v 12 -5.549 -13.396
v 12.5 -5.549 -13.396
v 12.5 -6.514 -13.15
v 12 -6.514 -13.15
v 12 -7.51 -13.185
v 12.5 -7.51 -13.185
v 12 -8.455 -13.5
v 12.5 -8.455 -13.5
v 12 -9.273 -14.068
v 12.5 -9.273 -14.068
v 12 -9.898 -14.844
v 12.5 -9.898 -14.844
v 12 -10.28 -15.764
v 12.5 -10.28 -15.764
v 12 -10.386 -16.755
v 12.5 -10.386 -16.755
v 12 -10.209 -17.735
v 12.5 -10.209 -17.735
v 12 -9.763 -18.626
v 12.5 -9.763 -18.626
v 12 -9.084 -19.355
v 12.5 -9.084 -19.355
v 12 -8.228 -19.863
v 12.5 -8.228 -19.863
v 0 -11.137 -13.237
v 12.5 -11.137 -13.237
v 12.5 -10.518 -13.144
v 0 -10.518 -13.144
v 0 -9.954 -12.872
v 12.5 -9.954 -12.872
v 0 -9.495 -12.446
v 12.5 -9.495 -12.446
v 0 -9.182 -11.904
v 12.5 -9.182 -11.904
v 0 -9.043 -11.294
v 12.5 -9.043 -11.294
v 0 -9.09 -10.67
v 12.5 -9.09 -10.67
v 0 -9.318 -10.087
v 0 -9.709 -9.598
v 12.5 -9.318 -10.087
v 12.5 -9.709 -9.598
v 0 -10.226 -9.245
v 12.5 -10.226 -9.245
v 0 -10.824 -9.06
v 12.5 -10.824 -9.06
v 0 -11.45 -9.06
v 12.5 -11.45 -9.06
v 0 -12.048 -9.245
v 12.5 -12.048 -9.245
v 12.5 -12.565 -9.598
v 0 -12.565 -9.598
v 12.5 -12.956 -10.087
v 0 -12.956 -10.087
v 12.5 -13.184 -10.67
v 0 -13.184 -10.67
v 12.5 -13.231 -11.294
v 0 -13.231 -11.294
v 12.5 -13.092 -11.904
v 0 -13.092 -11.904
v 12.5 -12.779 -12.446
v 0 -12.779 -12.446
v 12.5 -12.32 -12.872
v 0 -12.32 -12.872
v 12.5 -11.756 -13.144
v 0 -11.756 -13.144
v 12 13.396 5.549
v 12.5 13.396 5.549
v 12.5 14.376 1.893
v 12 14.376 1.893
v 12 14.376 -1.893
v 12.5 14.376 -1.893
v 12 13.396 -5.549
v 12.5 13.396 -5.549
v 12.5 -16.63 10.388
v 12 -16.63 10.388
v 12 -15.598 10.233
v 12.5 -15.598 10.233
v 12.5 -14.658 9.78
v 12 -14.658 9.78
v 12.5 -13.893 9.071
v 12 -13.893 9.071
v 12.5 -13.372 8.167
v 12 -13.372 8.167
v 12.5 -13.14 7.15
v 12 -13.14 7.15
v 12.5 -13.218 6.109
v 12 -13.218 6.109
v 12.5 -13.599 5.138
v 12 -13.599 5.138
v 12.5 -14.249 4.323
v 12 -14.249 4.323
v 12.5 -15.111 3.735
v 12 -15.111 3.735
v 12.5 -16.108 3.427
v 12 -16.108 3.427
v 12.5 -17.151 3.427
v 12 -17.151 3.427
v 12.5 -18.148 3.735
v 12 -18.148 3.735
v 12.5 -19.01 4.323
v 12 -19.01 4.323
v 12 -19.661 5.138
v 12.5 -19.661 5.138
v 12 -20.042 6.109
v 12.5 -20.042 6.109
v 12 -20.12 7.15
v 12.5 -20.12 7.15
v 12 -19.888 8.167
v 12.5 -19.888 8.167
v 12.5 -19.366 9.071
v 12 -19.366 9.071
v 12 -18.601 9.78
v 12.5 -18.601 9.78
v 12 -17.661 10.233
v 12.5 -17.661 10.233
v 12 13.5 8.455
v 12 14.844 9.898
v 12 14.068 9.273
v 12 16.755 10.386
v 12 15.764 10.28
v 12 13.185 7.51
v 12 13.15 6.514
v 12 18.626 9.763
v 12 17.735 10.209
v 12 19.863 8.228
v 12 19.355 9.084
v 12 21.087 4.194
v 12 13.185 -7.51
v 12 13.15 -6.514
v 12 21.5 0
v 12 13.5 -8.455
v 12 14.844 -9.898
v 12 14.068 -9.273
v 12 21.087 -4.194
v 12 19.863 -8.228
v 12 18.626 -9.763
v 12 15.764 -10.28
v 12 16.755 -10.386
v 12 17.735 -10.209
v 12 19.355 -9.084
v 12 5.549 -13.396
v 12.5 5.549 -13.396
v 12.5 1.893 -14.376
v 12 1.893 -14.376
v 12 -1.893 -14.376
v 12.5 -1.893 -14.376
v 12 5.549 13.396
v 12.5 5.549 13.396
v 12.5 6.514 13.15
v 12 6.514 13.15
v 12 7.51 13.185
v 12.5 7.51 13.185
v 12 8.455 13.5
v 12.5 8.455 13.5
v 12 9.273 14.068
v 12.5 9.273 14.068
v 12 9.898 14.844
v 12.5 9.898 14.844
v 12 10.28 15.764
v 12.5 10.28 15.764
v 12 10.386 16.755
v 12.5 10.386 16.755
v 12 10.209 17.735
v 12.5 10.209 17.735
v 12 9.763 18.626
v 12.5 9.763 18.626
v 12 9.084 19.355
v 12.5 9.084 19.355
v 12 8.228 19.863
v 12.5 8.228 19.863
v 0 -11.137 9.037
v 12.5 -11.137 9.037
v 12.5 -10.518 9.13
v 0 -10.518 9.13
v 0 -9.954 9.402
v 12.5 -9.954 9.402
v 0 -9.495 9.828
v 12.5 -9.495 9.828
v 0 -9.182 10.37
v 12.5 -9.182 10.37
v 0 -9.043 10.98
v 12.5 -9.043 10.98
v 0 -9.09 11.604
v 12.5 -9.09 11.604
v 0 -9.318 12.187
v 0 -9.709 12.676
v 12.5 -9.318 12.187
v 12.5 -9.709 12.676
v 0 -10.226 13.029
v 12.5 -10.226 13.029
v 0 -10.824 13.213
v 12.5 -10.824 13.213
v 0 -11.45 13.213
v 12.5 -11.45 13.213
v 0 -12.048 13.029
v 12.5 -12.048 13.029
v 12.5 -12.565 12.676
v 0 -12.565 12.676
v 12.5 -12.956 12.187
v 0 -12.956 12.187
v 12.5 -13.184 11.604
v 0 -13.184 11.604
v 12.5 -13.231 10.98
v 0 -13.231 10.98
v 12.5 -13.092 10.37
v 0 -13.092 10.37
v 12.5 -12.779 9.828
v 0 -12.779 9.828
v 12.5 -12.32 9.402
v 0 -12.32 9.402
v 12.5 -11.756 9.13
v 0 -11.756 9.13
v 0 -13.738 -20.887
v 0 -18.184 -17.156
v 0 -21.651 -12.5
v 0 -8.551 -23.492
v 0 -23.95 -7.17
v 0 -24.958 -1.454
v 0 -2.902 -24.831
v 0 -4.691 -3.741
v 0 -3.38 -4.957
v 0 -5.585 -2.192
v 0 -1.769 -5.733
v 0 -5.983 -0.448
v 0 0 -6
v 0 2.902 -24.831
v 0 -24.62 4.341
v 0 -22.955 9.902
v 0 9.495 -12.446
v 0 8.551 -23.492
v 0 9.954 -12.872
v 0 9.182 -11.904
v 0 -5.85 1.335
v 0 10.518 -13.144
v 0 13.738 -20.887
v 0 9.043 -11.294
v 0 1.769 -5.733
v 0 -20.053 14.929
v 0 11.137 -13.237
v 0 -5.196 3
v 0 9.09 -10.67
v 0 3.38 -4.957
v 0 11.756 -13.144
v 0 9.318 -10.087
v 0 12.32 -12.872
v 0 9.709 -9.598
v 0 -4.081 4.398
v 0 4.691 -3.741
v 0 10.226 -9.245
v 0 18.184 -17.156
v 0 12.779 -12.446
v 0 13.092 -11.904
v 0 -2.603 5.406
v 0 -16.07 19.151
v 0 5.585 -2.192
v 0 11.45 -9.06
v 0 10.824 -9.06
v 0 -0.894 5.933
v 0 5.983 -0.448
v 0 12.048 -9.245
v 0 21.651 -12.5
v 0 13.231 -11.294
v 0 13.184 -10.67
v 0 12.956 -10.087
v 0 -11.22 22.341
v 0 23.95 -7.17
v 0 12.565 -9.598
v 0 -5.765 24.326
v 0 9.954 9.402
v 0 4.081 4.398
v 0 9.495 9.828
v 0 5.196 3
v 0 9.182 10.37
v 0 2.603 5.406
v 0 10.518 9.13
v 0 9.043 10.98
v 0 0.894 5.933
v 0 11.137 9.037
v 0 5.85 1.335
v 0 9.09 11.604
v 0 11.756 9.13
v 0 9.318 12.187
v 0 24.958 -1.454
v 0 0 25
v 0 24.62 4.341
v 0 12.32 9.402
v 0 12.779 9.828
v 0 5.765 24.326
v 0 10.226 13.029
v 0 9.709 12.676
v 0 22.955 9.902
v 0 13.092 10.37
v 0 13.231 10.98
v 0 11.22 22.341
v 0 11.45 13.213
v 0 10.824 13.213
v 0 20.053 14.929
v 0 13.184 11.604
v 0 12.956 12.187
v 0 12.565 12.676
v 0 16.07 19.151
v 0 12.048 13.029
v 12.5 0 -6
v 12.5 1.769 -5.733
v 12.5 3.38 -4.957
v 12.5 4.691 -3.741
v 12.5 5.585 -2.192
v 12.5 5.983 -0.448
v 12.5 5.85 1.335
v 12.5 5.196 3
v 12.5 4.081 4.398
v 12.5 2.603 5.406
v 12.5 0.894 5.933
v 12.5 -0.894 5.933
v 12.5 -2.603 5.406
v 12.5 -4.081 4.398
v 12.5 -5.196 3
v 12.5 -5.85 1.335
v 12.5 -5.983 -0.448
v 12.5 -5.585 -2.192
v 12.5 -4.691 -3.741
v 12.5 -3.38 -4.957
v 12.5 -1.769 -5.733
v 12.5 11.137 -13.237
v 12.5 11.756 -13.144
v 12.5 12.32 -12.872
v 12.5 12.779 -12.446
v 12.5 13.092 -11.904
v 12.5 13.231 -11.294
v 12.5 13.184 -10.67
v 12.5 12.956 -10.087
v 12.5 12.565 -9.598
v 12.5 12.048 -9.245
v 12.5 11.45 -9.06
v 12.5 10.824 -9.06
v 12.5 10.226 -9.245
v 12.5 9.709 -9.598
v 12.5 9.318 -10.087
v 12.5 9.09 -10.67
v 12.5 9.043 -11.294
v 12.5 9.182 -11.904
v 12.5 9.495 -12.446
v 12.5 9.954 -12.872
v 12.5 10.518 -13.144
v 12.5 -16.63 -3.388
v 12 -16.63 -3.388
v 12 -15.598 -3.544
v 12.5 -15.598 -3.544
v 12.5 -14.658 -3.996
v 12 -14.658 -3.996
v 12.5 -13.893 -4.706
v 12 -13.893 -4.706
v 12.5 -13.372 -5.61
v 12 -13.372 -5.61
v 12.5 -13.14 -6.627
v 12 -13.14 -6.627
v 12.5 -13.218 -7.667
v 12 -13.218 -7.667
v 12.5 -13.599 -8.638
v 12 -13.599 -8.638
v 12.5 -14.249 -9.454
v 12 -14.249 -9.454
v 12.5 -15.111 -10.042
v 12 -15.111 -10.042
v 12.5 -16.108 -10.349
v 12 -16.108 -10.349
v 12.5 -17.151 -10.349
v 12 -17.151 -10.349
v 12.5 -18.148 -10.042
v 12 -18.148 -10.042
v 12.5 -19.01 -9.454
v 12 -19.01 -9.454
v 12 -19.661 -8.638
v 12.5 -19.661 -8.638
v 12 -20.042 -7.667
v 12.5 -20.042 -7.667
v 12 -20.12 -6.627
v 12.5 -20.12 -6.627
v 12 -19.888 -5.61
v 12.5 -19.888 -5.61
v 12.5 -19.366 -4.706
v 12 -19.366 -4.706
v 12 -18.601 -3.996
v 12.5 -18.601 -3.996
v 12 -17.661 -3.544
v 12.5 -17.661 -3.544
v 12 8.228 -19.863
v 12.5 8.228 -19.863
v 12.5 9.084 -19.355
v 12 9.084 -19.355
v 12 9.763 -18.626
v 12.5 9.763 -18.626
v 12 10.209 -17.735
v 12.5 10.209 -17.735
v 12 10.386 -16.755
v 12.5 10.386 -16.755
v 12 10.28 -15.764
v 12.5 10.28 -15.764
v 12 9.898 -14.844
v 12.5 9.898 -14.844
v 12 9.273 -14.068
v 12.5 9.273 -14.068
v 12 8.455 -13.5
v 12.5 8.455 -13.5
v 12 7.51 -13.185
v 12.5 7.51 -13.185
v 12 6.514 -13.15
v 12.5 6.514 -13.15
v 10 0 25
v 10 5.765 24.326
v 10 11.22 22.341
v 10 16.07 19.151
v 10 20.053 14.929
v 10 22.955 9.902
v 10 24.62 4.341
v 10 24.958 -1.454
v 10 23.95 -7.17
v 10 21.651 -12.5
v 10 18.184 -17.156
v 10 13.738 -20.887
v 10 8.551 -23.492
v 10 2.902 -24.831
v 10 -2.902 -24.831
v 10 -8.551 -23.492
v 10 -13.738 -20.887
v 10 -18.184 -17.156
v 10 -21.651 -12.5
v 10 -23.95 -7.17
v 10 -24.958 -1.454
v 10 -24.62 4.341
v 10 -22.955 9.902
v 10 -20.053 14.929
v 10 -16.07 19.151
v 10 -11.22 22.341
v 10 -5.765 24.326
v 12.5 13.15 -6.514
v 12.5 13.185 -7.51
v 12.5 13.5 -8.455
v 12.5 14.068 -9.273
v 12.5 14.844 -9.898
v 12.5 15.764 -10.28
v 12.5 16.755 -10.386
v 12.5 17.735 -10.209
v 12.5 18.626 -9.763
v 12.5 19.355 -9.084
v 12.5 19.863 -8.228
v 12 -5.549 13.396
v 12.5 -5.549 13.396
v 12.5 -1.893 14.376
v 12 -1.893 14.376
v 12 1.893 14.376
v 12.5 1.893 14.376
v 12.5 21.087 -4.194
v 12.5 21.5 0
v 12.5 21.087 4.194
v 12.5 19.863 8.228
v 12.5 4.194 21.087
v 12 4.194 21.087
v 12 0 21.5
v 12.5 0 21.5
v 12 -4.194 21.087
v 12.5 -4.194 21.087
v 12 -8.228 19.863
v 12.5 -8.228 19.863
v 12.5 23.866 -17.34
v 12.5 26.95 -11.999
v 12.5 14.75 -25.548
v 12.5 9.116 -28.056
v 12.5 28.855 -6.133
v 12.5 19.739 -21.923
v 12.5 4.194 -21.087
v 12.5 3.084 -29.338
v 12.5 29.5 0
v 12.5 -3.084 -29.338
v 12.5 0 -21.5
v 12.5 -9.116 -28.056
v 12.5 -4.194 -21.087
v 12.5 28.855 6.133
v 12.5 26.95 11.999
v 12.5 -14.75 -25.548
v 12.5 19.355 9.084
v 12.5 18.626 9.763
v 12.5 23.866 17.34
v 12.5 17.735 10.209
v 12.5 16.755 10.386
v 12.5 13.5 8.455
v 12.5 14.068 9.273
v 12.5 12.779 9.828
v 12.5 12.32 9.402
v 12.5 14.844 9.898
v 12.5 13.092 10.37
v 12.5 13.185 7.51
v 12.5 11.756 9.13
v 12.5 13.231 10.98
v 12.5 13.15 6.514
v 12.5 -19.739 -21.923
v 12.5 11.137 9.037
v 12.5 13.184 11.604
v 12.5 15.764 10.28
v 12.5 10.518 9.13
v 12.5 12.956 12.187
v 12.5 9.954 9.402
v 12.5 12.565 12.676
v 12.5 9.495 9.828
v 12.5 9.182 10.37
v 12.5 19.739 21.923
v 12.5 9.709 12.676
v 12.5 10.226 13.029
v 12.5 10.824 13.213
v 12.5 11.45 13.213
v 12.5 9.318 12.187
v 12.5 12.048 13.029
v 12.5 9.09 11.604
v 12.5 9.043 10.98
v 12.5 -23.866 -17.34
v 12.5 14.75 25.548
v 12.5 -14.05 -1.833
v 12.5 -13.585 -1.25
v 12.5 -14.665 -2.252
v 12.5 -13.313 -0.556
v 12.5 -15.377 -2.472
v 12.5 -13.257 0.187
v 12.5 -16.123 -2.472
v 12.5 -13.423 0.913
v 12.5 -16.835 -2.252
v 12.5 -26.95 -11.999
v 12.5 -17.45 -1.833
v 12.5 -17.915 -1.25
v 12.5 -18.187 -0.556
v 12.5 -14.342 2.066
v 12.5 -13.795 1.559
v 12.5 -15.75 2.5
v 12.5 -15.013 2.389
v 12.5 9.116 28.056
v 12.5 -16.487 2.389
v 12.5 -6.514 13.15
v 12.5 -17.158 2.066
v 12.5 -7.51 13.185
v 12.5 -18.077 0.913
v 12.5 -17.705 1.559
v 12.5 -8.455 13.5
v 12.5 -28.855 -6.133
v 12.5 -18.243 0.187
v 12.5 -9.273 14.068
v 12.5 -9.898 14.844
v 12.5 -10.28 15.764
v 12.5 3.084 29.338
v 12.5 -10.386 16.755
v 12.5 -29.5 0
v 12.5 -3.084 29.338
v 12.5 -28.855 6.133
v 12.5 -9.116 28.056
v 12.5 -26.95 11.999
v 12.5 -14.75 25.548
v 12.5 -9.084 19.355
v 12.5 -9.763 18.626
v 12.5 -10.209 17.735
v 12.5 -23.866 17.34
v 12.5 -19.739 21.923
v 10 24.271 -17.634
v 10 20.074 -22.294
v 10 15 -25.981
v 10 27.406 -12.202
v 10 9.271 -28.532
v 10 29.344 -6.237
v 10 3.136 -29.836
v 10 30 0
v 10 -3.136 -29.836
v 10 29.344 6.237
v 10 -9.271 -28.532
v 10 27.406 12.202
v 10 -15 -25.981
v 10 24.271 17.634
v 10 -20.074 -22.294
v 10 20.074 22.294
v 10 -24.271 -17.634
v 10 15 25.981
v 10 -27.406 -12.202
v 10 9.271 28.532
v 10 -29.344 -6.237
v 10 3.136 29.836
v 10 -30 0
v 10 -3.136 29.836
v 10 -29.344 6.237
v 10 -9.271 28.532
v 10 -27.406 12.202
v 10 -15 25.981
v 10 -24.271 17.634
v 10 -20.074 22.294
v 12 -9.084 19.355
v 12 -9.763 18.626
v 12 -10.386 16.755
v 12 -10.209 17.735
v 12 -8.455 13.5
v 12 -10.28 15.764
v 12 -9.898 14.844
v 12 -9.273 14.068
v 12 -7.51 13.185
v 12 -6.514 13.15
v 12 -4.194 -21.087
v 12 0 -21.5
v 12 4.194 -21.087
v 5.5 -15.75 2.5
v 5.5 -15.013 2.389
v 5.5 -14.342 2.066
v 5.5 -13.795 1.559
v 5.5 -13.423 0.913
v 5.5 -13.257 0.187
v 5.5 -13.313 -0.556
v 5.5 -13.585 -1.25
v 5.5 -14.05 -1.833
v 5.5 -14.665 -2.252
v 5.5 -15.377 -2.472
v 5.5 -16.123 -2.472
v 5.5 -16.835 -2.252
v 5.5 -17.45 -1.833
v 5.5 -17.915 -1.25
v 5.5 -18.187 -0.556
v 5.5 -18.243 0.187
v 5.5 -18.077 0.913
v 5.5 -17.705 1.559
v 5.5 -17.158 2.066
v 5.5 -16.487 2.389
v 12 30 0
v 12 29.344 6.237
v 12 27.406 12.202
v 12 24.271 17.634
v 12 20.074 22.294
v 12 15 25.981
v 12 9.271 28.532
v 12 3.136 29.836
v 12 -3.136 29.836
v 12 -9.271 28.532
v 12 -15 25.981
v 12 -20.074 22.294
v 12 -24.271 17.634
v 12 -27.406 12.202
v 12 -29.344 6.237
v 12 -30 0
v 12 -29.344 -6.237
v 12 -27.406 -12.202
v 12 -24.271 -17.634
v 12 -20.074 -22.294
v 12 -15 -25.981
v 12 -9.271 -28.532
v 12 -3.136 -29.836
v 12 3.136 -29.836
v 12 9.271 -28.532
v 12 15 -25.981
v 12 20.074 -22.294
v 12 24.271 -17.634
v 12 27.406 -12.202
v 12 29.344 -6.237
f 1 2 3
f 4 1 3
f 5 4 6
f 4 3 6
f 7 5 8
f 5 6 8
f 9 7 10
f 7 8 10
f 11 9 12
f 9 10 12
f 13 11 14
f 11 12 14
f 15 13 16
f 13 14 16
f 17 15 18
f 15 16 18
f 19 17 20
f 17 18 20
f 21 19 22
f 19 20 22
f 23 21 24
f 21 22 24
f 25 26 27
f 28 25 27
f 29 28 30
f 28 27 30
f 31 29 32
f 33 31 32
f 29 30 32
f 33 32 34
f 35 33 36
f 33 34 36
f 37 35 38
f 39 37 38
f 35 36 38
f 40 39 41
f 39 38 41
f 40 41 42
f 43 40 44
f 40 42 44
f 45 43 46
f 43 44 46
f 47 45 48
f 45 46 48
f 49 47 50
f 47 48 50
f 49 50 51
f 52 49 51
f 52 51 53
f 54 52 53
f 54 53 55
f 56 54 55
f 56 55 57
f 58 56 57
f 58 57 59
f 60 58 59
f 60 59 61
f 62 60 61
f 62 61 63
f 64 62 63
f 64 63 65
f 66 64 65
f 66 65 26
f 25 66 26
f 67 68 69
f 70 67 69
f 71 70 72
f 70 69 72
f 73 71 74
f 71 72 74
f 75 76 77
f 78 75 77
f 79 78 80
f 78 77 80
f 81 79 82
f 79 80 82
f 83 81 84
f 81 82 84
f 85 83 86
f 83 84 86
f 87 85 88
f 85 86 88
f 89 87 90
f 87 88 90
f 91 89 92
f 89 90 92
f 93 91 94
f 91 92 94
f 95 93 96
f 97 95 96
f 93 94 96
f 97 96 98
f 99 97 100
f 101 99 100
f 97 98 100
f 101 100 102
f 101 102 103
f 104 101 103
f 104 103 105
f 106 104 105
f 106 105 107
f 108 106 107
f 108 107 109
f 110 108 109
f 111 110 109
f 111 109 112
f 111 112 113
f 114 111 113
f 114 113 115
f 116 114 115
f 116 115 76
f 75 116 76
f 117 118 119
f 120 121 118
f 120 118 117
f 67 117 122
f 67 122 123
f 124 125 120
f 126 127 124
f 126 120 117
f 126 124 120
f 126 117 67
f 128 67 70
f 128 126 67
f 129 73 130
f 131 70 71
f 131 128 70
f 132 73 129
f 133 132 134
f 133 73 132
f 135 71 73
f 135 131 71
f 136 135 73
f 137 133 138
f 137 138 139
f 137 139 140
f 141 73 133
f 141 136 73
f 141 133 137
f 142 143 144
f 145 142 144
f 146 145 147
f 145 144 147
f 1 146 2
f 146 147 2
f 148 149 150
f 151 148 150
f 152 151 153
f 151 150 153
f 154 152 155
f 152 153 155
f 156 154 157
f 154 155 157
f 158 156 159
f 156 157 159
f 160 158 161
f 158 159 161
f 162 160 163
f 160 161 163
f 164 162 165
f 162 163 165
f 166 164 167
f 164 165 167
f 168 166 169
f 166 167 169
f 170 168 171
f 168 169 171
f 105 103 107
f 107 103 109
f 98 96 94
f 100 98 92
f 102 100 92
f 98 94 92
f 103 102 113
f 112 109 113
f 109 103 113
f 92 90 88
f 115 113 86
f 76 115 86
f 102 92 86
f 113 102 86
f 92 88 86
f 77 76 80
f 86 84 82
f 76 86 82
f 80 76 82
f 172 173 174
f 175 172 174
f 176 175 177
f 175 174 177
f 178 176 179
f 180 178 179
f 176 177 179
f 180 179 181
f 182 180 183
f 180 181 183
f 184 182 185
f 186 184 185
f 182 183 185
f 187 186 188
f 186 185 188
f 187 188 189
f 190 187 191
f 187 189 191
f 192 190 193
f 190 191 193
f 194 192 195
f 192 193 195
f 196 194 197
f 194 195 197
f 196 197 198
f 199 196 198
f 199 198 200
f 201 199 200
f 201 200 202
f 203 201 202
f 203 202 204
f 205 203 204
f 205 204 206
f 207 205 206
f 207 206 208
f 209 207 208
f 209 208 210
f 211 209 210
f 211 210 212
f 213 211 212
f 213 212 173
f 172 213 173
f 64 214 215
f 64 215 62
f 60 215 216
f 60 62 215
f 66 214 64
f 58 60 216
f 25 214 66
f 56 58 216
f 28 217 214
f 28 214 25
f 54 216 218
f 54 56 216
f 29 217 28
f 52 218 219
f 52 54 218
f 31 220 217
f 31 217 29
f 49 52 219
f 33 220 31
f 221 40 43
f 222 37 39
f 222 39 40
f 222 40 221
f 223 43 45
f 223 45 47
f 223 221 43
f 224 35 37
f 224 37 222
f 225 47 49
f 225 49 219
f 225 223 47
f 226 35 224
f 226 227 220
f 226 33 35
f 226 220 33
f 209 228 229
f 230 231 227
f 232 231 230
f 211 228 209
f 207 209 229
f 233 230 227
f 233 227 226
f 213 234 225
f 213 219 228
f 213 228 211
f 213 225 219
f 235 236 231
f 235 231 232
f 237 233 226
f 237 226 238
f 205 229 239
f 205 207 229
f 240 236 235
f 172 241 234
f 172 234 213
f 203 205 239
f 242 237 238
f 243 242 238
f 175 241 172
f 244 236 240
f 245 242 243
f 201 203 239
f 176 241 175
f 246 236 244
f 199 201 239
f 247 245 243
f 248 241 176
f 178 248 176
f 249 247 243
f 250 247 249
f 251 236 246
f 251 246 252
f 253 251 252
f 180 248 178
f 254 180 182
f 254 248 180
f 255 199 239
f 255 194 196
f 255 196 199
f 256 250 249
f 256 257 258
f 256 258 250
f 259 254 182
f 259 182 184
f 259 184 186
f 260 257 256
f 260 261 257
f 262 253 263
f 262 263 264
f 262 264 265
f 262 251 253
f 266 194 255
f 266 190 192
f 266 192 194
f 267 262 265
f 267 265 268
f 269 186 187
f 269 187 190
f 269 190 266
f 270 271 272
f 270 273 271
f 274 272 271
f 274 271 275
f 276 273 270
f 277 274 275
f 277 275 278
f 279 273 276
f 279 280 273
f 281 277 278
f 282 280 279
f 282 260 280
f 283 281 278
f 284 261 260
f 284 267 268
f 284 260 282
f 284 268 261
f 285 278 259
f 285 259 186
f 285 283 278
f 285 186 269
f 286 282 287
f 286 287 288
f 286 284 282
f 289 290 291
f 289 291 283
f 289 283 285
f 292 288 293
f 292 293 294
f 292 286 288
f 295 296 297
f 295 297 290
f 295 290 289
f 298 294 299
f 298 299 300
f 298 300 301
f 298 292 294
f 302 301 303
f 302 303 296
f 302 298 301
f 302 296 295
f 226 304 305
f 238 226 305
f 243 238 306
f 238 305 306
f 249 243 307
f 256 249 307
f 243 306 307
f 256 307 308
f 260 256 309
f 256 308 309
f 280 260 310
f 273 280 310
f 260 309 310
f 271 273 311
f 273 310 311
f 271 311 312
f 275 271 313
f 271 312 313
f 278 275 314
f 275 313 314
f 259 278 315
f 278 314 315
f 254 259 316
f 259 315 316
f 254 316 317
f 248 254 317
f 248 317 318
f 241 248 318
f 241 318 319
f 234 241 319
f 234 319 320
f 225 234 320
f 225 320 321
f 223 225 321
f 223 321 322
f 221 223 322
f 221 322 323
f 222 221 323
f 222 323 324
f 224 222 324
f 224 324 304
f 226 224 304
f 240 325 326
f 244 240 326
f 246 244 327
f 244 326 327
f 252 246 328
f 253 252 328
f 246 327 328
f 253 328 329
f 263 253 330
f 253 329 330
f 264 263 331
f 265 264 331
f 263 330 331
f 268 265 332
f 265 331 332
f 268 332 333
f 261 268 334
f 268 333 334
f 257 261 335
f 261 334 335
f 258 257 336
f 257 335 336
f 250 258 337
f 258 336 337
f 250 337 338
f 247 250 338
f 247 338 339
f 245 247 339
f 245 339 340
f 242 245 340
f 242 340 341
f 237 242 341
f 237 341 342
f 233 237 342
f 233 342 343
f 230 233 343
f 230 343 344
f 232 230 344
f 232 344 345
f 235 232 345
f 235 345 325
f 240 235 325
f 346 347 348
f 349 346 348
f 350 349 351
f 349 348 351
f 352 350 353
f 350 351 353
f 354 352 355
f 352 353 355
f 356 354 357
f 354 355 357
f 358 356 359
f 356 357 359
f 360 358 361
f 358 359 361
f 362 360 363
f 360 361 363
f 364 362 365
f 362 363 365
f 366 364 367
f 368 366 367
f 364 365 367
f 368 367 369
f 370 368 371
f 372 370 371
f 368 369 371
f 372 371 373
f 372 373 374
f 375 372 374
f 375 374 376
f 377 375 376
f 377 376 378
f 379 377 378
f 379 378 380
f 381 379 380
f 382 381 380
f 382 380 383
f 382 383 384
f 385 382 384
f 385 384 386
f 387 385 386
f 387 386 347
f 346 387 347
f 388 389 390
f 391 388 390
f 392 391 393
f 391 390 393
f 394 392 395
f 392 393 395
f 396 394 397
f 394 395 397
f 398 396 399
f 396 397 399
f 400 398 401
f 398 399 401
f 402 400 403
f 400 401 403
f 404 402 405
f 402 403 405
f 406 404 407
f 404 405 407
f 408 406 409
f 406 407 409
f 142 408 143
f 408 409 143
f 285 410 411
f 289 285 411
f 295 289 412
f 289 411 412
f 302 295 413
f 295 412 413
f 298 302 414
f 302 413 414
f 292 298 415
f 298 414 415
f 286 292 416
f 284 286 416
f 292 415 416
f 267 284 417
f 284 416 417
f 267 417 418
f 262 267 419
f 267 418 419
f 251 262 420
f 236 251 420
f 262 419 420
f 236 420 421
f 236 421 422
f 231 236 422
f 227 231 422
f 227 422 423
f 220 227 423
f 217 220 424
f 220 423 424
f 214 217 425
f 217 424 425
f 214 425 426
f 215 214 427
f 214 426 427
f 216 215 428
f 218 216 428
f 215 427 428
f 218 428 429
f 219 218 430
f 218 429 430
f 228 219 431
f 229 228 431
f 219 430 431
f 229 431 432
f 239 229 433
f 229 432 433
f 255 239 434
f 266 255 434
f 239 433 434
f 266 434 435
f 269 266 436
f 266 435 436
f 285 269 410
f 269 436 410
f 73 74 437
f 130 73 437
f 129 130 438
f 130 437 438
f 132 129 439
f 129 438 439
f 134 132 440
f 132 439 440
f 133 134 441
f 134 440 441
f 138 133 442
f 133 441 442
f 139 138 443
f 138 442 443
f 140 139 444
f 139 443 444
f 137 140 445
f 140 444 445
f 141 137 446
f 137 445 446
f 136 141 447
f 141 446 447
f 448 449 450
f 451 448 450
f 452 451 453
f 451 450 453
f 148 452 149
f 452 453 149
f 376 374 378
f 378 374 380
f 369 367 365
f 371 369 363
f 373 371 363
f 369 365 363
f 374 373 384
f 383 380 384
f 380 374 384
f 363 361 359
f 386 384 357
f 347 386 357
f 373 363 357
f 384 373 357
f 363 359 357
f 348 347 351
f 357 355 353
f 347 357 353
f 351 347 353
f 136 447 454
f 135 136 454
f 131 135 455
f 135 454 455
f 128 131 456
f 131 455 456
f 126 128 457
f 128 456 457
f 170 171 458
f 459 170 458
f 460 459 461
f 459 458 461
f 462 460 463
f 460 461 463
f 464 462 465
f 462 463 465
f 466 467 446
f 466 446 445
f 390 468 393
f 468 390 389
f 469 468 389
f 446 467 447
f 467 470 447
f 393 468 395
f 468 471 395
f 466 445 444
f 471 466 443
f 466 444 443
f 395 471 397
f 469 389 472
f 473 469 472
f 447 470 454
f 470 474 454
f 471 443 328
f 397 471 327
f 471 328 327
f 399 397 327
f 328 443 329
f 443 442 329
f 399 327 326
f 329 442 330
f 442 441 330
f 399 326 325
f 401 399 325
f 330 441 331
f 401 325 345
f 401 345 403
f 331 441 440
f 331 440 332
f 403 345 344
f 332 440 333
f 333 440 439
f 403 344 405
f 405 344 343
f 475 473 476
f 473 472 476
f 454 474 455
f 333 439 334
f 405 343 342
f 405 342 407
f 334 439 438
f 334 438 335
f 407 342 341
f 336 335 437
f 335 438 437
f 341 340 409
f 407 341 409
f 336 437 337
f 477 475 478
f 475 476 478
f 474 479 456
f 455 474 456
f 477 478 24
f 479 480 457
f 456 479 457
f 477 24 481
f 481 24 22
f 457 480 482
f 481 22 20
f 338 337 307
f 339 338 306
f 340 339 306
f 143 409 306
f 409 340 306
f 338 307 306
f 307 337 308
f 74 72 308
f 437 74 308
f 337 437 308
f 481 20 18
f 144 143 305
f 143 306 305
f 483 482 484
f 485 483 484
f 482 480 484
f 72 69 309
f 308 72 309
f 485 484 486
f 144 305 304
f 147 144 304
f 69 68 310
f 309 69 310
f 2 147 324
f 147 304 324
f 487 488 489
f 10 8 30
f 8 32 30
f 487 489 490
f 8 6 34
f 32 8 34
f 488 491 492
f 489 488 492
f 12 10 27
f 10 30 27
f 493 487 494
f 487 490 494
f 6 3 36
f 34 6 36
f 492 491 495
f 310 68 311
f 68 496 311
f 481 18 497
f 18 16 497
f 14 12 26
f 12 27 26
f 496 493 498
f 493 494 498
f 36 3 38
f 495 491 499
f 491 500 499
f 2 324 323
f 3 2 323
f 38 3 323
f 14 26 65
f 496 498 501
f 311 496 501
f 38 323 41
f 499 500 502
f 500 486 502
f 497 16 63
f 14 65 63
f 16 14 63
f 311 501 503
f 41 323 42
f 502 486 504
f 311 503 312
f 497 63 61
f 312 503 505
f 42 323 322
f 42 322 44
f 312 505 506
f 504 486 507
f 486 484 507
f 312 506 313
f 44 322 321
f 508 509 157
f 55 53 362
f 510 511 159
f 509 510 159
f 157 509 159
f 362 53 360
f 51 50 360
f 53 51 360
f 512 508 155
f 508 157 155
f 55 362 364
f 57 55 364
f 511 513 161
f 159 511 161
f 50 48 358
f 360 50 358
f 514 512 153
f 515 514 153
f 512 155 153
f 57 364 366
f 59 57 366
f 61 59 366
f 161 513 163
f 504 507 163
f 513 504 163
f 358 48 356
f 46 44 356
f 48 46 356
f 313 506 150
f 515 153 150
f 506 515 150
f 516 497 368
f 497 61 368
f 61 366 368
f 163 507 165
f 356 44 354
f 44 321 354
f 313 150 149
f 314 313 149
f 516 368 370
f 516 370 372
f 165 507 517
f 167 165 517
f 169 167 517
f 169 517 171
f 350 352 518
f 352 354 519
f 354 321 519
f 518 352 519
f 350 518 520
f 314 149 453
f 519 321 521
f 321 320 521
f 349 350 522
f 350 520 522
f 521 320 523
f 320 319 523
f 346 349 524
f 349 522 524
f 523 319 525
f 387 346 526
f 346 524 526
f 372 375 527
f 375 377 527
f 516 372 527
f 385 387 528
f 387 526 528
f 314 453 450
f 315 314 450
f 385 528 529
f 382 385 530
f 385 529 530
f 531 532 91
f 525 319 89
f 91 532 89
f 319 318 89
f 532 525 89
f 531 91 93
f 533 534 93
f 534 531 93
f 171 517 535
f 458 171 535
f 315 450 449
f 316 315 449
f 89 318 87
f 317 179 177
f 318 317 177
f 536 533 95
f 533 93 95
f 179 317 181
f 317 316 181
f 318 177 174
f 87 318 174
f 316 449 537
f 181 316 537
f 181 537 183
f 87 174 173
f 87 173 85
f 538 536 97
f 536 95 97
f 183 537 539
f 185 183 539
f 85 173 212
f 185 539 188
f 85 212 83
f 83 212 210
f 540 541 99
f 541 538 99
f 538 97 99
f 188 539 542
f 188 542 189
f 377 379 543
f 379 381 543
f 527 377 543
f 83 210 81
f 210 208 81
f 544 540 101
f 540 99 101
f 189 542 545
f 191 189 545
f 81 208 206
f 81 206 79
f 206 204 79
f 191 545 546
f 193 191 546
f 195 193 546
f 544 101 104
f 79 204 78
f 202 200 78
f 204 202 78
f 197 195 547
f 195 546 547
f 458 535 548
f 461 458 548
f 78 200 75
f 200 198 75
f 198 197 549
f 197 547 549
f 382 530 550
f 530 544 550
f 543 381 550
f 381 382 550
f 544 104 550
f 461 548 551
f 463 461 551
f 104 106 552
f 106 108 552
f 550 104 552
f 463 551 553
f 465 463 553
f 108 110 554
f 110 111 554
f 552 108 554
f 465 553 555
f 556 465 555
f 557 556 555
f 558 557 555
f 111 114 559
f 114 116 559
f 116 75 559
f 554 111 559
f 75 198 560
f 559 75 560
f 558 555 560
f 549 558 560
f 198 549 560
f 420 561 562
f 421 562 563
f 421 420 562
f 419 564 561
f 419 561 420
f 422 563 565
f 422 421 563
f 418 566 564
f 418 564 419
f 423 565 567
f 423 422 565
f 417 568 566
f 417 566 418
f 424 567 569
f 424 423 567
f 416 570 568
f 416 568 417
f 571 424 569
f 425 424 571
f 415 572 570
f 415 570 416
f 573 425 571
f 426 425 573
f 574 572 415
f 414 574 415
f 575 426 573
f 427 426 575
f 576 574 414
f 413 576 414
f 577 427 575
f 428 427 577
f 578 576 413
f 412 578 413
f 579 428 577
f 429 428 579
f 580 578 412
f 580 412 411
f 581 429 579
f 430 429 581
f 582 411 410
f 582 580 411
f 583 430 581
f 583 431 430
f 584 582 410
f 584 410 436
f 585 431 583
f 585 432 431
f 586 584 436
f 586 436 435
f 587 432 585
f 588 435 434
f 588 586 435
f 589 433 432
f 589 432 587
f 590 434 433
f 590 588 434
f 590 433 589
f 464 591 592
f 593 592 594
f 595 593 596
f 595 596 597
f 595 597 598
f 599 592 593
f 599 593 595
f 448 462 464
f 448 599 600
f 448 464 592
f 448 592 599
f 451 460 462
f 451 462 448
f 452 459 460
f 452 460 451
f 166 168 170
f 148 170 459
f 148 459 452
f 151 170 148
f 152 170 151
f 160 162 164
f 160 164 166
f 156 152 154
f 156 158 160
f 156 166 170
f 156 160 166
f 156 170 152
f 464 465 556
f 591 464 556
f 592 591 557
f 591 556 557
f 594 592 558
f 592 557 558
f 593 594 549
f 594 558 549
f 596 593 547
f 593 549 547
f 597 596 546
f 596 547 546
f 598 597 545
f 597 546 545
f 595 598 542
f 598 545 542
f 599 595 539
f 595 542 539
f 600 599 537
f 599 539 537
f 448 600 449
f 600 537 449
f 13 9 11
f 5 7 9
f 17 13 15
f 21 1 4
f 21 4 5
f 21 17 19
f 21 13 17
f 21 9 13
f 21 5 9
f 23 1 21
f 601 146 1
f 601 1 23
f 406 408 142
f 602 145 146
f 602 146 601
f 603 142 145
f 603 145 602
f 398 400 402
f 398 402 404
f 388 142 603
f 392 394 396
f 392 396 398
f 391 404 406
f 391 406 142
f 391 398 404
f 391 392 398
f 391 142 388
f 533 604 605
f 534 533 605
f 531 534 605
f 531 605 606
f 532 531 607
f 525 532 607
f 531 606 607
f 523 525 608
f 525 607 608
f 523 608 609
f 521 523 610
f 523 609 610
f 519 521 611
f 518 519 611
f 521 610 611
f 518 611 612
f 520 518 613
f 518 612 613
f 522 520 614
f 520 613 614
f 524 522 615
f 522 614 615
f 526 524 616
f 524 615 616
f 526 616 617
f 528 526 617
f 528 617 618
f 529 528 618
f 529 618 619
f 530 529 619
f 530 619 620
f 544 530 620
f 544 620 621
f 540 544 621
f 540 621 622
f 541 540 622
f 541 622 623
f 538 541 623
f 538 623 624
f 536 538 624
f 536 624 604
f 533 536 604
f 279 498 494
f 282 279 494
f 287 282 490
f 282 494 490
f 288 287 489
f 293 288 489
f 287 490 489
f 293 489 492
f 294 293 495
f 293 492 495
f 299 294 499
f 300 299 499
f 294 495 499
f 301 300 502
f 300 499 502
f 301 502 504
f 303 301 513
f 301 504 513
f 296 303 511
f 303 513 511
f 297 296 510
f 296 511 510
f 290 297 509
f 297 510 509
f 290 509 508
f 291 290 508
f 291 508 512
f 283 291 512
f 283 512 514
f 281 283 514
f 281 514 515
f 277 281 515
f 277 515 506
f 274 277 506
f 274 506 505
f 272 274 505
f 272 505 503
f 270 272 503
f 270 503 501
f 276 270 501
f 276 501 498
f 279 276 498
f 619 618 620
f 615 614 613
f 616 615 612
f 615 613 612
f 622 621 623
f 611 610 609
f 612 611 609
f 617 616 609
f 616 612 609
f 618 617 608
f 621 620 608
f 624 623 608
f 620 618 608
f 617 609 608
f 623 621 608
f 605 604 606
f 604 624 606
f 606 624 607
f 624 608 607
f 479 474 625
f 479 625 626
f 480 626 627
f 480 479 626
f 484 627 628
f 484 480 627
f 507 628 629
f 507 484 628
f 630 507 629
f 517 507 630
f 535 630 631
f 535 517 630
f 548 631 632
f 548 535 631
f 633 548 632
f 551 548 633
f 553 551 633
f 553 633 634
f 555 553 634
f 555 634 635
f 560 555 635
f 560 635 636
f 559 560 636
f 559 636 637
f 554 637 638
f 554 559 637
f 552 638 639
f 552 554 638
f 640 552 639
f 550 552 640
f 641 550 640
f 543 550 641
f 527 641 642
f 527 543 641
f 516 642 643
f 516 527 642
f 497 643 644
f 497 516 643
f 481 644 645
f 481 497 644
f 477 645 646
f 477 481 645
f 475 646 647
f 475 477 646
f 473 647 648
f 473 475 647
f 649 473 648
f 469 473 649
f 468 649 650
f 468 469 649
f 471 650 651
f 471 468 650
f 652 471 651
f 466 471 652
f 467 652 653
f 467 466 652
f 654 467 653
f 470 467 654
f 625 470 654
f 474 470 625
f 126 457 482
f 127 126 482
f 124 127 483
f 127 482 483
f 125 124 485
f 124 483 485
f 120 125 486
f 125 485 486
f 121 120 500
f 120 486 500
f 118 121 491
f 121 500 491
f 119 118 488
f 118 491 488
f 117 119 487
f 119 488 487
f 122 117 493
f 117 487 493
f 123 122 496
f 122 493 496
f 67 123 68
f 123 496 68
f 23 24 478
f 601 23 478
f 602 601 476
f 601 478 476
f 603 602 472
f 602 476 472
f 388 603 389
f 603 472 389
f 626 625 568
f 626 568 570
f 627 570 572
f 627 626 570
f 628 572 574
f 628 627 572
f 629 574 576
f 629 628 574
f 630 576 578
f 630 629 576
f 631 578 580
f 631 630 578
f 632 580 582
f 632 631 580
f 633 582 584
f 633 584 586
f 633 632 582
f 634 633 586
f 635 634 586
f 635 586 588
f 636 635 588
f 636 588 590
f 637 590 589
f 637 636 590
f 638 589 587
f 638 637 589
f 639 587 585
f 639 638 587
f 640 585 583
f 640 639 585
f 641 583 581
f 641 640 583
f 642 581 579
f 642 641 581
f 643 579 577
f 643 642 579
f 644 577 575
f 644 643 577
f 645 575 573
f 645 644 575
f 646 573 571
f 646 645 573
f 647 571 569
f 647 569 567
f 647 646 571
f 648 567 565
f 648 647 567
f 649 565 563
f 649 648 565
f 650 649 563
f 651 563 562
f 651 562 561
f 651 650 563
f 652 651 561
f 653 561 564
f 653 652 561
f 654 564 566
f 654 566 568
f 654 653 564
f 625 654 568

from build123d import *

# Parameters (mm, degrees)
SKETCH1_W                      = 2.5
SKETCH1_H                      = 30
SKETCH2_R                      = 25
BOSS_EXTRUDE1_DEPTH            = 10
CUT_EXTRUDE1_DEPTH             = 0.5
CUT_EXTRUDE2_DEPTH             = 0.5
CUT_EXTRUDE3_DEPTH             = 0.5
F_12_0_12_DIAMETER_HOLE1_D     = 12
F_12_0_12_DIAMETER_HOLE1_DEPTH = 12.5
F_7_0_7_DIAMETER_HOLE1_D       = 7
F_7_0_7_DIAMETER_HOLE1_DEPTH   = 0.5
F_4_2_4_2_DIAMETER_HOLE1_D     = 4.2
F_4_2_4_2_DIAMETER_HOLE1_DEPTH = 12.5
F_5_0_5_DIAMETER_HOLE1_D       = 5
F_5_0_5_DIAMETER_HOLE1_DEPTH   = 7
CHAMFER1_SIZE                  = 0.5


with BuildPart() as part:
    # Sketch1 → Revolve1 (revolve)
    with BuildSketch(Plane.XY):
        with Locations((11.25, 15)):
            Rectangle(SKETCH1_W, SKETCH1_H)
    revolve(axis=Axis((10, 0, 0), (1, 0, 0)))

    # Sketch2 → Boss-Extrude1 (add)
    with BuildSketch(Plane.ZY.offset(-10)):
        Circle(SKETCH2_R)
    extrude(amount=BOSS_EXTRUDE1_DEPTH)

    # Sketch3 → Cut-Extrude1 (cut)
    with BuildSketch(Plane(origin=(12.5, 0, 0), x_dir=(0, 0, -1), z_dir=(1, 0, 0))):
        with BuildLine():
            ThreePointArc((13.396253221, 5.548909769), (14.5, 0), (13.396253221, -5.548909769))
            ThreePointArc((13.396253221, -5.548909769), (15.290439572, -10.121880146), (19.863409949, -8.227693796))
            ThreePointArc((19.863409949, -8.227693796), (21.5, 0), (19.863409949, 8.227693796))
            ThreePointArc((19.863409949, 8.227693796), (15.290439572, 10.121880146), (13.396253221, 5.548909769))
        make_face()
    extrude(amount=-CUT_EXTRUDE1_DEPTH, mode=Mode.SUBTRACT)

    # Sketch4 → Cut-Extrude2 (cut)
    with BuildSketch(Plane(origin=(12.5, 0, 0), x_dir=(0, 0, -1), z_dir=(1, 0, 0))):
        with BuildLine():
            ThreePointArc((-5.548909769, 13.396253221), (0, 14.5), (5.548909769, 13.396253221))
            ThreePointArc((5.548909769, 13.396253221), (10.121880146, 15.290439572), (8.227693796, 19.863409949))
            ThreePointArc((8.227693796, 19.863409949), (0, 21.5), (-8.227693796, 19.863409949))
            ThreePointArc((-8.227693796, 19.863409949), (-10.121880146, 15.290439572), (-5.548909769, 13.396253221))
        make_face()
    extrude(amount=-CUT_EXTRUDE2_DEPTH, mode=Mode.SUBTRACT)

    # Sketch5 → Cut-Extrude3 (cut)
    with BuildSketch(Plane(origin=(12.5, 0, 0), x_dir=(0, 0, -1), z_dir=(1, 0, 0))):
        with BuildLine():
            ThreePointArc((-13.396253221, -5.548909769), (-14.5, 0), (-13.396253221, 5.548909769))
            ThreePointArc((-13.396253221, 5.548909769), (-15.290439572, 10.121880146), (-19.863409949, 8.227693796))
            ThreePointArc((-19.863409949, 8.227693796), (-21.5, 0), (-19.863409949, -8.227693796))
            ThreePointArc((-19.863409949, -8.227693796), (-15.290439572, -10.121880146), (-13.396253221, -5.548909769))
        make_face()
    extrude(amount=-CUT_EXTRUDE3_DEPTH, mode=Mode.SUBTRACT)

    # Ø12.0 (12) Diameter Hole1
    with Locations(Plane.ZY):
        with Locations((0, 0)):
            Hole(F_12_0_12_DIAMETER_HOLE1_D / 2, depth=F_12_0_12_DIAMETER_HOLE1_DEPTH)

    # Ø7.0 (7) Diameter Hole1
    with Locations(Plane(origin=(12.5, 0, 0), x_dir=(0, 0, -1), z_dir=(1, 0, 0))):
        with Locations((-6.888301783, -16.629831585), (6.888301783, -16.629831585)):
            Hole(F_7_0_7_DIAMETER_HOLE1_D / 2, depth=F_7_0_7_DIAMETER_HOLE1_DEPTH)

    # Ø4.2 (4.2) Diameter Hole1
    with Locations(Plane.ZY):
        with Locations((-11.136931804, -11.136931804), (-11.136931804, 11.136931804), (11.136931804, 11.136931804), (11.136931804, -11.136931804)):
            Hole(F_4_2_4_2_DIAMETER_HOLE1_D / 2, depth=F_4_2_4_2_DIAMETER_HOLE1_DEPTH)

    # Ø5.0 (5) Diameter Hole1
    with Locations(Plane(origin=(12.5, 0, 0), x_dir=(0, 0, -1), z_dir=(1, 0, 0))):
        with Locations((0, -15.75)):
            Hole(F_5_0_5_DIAMETER_HOLE1_D / 2, depth=F_5_0_5_DIAMETER_HOLE1_DEPTH)

    # Chamfer1
    chamfer1_edges = [part.edges().sort_by_distance(p)[0] for p in [
        (12.5, -30, 0),
    ]]
    chamfer(chamfer1_edges, length=CHAMFER1_SIZE)


solid = part.part
